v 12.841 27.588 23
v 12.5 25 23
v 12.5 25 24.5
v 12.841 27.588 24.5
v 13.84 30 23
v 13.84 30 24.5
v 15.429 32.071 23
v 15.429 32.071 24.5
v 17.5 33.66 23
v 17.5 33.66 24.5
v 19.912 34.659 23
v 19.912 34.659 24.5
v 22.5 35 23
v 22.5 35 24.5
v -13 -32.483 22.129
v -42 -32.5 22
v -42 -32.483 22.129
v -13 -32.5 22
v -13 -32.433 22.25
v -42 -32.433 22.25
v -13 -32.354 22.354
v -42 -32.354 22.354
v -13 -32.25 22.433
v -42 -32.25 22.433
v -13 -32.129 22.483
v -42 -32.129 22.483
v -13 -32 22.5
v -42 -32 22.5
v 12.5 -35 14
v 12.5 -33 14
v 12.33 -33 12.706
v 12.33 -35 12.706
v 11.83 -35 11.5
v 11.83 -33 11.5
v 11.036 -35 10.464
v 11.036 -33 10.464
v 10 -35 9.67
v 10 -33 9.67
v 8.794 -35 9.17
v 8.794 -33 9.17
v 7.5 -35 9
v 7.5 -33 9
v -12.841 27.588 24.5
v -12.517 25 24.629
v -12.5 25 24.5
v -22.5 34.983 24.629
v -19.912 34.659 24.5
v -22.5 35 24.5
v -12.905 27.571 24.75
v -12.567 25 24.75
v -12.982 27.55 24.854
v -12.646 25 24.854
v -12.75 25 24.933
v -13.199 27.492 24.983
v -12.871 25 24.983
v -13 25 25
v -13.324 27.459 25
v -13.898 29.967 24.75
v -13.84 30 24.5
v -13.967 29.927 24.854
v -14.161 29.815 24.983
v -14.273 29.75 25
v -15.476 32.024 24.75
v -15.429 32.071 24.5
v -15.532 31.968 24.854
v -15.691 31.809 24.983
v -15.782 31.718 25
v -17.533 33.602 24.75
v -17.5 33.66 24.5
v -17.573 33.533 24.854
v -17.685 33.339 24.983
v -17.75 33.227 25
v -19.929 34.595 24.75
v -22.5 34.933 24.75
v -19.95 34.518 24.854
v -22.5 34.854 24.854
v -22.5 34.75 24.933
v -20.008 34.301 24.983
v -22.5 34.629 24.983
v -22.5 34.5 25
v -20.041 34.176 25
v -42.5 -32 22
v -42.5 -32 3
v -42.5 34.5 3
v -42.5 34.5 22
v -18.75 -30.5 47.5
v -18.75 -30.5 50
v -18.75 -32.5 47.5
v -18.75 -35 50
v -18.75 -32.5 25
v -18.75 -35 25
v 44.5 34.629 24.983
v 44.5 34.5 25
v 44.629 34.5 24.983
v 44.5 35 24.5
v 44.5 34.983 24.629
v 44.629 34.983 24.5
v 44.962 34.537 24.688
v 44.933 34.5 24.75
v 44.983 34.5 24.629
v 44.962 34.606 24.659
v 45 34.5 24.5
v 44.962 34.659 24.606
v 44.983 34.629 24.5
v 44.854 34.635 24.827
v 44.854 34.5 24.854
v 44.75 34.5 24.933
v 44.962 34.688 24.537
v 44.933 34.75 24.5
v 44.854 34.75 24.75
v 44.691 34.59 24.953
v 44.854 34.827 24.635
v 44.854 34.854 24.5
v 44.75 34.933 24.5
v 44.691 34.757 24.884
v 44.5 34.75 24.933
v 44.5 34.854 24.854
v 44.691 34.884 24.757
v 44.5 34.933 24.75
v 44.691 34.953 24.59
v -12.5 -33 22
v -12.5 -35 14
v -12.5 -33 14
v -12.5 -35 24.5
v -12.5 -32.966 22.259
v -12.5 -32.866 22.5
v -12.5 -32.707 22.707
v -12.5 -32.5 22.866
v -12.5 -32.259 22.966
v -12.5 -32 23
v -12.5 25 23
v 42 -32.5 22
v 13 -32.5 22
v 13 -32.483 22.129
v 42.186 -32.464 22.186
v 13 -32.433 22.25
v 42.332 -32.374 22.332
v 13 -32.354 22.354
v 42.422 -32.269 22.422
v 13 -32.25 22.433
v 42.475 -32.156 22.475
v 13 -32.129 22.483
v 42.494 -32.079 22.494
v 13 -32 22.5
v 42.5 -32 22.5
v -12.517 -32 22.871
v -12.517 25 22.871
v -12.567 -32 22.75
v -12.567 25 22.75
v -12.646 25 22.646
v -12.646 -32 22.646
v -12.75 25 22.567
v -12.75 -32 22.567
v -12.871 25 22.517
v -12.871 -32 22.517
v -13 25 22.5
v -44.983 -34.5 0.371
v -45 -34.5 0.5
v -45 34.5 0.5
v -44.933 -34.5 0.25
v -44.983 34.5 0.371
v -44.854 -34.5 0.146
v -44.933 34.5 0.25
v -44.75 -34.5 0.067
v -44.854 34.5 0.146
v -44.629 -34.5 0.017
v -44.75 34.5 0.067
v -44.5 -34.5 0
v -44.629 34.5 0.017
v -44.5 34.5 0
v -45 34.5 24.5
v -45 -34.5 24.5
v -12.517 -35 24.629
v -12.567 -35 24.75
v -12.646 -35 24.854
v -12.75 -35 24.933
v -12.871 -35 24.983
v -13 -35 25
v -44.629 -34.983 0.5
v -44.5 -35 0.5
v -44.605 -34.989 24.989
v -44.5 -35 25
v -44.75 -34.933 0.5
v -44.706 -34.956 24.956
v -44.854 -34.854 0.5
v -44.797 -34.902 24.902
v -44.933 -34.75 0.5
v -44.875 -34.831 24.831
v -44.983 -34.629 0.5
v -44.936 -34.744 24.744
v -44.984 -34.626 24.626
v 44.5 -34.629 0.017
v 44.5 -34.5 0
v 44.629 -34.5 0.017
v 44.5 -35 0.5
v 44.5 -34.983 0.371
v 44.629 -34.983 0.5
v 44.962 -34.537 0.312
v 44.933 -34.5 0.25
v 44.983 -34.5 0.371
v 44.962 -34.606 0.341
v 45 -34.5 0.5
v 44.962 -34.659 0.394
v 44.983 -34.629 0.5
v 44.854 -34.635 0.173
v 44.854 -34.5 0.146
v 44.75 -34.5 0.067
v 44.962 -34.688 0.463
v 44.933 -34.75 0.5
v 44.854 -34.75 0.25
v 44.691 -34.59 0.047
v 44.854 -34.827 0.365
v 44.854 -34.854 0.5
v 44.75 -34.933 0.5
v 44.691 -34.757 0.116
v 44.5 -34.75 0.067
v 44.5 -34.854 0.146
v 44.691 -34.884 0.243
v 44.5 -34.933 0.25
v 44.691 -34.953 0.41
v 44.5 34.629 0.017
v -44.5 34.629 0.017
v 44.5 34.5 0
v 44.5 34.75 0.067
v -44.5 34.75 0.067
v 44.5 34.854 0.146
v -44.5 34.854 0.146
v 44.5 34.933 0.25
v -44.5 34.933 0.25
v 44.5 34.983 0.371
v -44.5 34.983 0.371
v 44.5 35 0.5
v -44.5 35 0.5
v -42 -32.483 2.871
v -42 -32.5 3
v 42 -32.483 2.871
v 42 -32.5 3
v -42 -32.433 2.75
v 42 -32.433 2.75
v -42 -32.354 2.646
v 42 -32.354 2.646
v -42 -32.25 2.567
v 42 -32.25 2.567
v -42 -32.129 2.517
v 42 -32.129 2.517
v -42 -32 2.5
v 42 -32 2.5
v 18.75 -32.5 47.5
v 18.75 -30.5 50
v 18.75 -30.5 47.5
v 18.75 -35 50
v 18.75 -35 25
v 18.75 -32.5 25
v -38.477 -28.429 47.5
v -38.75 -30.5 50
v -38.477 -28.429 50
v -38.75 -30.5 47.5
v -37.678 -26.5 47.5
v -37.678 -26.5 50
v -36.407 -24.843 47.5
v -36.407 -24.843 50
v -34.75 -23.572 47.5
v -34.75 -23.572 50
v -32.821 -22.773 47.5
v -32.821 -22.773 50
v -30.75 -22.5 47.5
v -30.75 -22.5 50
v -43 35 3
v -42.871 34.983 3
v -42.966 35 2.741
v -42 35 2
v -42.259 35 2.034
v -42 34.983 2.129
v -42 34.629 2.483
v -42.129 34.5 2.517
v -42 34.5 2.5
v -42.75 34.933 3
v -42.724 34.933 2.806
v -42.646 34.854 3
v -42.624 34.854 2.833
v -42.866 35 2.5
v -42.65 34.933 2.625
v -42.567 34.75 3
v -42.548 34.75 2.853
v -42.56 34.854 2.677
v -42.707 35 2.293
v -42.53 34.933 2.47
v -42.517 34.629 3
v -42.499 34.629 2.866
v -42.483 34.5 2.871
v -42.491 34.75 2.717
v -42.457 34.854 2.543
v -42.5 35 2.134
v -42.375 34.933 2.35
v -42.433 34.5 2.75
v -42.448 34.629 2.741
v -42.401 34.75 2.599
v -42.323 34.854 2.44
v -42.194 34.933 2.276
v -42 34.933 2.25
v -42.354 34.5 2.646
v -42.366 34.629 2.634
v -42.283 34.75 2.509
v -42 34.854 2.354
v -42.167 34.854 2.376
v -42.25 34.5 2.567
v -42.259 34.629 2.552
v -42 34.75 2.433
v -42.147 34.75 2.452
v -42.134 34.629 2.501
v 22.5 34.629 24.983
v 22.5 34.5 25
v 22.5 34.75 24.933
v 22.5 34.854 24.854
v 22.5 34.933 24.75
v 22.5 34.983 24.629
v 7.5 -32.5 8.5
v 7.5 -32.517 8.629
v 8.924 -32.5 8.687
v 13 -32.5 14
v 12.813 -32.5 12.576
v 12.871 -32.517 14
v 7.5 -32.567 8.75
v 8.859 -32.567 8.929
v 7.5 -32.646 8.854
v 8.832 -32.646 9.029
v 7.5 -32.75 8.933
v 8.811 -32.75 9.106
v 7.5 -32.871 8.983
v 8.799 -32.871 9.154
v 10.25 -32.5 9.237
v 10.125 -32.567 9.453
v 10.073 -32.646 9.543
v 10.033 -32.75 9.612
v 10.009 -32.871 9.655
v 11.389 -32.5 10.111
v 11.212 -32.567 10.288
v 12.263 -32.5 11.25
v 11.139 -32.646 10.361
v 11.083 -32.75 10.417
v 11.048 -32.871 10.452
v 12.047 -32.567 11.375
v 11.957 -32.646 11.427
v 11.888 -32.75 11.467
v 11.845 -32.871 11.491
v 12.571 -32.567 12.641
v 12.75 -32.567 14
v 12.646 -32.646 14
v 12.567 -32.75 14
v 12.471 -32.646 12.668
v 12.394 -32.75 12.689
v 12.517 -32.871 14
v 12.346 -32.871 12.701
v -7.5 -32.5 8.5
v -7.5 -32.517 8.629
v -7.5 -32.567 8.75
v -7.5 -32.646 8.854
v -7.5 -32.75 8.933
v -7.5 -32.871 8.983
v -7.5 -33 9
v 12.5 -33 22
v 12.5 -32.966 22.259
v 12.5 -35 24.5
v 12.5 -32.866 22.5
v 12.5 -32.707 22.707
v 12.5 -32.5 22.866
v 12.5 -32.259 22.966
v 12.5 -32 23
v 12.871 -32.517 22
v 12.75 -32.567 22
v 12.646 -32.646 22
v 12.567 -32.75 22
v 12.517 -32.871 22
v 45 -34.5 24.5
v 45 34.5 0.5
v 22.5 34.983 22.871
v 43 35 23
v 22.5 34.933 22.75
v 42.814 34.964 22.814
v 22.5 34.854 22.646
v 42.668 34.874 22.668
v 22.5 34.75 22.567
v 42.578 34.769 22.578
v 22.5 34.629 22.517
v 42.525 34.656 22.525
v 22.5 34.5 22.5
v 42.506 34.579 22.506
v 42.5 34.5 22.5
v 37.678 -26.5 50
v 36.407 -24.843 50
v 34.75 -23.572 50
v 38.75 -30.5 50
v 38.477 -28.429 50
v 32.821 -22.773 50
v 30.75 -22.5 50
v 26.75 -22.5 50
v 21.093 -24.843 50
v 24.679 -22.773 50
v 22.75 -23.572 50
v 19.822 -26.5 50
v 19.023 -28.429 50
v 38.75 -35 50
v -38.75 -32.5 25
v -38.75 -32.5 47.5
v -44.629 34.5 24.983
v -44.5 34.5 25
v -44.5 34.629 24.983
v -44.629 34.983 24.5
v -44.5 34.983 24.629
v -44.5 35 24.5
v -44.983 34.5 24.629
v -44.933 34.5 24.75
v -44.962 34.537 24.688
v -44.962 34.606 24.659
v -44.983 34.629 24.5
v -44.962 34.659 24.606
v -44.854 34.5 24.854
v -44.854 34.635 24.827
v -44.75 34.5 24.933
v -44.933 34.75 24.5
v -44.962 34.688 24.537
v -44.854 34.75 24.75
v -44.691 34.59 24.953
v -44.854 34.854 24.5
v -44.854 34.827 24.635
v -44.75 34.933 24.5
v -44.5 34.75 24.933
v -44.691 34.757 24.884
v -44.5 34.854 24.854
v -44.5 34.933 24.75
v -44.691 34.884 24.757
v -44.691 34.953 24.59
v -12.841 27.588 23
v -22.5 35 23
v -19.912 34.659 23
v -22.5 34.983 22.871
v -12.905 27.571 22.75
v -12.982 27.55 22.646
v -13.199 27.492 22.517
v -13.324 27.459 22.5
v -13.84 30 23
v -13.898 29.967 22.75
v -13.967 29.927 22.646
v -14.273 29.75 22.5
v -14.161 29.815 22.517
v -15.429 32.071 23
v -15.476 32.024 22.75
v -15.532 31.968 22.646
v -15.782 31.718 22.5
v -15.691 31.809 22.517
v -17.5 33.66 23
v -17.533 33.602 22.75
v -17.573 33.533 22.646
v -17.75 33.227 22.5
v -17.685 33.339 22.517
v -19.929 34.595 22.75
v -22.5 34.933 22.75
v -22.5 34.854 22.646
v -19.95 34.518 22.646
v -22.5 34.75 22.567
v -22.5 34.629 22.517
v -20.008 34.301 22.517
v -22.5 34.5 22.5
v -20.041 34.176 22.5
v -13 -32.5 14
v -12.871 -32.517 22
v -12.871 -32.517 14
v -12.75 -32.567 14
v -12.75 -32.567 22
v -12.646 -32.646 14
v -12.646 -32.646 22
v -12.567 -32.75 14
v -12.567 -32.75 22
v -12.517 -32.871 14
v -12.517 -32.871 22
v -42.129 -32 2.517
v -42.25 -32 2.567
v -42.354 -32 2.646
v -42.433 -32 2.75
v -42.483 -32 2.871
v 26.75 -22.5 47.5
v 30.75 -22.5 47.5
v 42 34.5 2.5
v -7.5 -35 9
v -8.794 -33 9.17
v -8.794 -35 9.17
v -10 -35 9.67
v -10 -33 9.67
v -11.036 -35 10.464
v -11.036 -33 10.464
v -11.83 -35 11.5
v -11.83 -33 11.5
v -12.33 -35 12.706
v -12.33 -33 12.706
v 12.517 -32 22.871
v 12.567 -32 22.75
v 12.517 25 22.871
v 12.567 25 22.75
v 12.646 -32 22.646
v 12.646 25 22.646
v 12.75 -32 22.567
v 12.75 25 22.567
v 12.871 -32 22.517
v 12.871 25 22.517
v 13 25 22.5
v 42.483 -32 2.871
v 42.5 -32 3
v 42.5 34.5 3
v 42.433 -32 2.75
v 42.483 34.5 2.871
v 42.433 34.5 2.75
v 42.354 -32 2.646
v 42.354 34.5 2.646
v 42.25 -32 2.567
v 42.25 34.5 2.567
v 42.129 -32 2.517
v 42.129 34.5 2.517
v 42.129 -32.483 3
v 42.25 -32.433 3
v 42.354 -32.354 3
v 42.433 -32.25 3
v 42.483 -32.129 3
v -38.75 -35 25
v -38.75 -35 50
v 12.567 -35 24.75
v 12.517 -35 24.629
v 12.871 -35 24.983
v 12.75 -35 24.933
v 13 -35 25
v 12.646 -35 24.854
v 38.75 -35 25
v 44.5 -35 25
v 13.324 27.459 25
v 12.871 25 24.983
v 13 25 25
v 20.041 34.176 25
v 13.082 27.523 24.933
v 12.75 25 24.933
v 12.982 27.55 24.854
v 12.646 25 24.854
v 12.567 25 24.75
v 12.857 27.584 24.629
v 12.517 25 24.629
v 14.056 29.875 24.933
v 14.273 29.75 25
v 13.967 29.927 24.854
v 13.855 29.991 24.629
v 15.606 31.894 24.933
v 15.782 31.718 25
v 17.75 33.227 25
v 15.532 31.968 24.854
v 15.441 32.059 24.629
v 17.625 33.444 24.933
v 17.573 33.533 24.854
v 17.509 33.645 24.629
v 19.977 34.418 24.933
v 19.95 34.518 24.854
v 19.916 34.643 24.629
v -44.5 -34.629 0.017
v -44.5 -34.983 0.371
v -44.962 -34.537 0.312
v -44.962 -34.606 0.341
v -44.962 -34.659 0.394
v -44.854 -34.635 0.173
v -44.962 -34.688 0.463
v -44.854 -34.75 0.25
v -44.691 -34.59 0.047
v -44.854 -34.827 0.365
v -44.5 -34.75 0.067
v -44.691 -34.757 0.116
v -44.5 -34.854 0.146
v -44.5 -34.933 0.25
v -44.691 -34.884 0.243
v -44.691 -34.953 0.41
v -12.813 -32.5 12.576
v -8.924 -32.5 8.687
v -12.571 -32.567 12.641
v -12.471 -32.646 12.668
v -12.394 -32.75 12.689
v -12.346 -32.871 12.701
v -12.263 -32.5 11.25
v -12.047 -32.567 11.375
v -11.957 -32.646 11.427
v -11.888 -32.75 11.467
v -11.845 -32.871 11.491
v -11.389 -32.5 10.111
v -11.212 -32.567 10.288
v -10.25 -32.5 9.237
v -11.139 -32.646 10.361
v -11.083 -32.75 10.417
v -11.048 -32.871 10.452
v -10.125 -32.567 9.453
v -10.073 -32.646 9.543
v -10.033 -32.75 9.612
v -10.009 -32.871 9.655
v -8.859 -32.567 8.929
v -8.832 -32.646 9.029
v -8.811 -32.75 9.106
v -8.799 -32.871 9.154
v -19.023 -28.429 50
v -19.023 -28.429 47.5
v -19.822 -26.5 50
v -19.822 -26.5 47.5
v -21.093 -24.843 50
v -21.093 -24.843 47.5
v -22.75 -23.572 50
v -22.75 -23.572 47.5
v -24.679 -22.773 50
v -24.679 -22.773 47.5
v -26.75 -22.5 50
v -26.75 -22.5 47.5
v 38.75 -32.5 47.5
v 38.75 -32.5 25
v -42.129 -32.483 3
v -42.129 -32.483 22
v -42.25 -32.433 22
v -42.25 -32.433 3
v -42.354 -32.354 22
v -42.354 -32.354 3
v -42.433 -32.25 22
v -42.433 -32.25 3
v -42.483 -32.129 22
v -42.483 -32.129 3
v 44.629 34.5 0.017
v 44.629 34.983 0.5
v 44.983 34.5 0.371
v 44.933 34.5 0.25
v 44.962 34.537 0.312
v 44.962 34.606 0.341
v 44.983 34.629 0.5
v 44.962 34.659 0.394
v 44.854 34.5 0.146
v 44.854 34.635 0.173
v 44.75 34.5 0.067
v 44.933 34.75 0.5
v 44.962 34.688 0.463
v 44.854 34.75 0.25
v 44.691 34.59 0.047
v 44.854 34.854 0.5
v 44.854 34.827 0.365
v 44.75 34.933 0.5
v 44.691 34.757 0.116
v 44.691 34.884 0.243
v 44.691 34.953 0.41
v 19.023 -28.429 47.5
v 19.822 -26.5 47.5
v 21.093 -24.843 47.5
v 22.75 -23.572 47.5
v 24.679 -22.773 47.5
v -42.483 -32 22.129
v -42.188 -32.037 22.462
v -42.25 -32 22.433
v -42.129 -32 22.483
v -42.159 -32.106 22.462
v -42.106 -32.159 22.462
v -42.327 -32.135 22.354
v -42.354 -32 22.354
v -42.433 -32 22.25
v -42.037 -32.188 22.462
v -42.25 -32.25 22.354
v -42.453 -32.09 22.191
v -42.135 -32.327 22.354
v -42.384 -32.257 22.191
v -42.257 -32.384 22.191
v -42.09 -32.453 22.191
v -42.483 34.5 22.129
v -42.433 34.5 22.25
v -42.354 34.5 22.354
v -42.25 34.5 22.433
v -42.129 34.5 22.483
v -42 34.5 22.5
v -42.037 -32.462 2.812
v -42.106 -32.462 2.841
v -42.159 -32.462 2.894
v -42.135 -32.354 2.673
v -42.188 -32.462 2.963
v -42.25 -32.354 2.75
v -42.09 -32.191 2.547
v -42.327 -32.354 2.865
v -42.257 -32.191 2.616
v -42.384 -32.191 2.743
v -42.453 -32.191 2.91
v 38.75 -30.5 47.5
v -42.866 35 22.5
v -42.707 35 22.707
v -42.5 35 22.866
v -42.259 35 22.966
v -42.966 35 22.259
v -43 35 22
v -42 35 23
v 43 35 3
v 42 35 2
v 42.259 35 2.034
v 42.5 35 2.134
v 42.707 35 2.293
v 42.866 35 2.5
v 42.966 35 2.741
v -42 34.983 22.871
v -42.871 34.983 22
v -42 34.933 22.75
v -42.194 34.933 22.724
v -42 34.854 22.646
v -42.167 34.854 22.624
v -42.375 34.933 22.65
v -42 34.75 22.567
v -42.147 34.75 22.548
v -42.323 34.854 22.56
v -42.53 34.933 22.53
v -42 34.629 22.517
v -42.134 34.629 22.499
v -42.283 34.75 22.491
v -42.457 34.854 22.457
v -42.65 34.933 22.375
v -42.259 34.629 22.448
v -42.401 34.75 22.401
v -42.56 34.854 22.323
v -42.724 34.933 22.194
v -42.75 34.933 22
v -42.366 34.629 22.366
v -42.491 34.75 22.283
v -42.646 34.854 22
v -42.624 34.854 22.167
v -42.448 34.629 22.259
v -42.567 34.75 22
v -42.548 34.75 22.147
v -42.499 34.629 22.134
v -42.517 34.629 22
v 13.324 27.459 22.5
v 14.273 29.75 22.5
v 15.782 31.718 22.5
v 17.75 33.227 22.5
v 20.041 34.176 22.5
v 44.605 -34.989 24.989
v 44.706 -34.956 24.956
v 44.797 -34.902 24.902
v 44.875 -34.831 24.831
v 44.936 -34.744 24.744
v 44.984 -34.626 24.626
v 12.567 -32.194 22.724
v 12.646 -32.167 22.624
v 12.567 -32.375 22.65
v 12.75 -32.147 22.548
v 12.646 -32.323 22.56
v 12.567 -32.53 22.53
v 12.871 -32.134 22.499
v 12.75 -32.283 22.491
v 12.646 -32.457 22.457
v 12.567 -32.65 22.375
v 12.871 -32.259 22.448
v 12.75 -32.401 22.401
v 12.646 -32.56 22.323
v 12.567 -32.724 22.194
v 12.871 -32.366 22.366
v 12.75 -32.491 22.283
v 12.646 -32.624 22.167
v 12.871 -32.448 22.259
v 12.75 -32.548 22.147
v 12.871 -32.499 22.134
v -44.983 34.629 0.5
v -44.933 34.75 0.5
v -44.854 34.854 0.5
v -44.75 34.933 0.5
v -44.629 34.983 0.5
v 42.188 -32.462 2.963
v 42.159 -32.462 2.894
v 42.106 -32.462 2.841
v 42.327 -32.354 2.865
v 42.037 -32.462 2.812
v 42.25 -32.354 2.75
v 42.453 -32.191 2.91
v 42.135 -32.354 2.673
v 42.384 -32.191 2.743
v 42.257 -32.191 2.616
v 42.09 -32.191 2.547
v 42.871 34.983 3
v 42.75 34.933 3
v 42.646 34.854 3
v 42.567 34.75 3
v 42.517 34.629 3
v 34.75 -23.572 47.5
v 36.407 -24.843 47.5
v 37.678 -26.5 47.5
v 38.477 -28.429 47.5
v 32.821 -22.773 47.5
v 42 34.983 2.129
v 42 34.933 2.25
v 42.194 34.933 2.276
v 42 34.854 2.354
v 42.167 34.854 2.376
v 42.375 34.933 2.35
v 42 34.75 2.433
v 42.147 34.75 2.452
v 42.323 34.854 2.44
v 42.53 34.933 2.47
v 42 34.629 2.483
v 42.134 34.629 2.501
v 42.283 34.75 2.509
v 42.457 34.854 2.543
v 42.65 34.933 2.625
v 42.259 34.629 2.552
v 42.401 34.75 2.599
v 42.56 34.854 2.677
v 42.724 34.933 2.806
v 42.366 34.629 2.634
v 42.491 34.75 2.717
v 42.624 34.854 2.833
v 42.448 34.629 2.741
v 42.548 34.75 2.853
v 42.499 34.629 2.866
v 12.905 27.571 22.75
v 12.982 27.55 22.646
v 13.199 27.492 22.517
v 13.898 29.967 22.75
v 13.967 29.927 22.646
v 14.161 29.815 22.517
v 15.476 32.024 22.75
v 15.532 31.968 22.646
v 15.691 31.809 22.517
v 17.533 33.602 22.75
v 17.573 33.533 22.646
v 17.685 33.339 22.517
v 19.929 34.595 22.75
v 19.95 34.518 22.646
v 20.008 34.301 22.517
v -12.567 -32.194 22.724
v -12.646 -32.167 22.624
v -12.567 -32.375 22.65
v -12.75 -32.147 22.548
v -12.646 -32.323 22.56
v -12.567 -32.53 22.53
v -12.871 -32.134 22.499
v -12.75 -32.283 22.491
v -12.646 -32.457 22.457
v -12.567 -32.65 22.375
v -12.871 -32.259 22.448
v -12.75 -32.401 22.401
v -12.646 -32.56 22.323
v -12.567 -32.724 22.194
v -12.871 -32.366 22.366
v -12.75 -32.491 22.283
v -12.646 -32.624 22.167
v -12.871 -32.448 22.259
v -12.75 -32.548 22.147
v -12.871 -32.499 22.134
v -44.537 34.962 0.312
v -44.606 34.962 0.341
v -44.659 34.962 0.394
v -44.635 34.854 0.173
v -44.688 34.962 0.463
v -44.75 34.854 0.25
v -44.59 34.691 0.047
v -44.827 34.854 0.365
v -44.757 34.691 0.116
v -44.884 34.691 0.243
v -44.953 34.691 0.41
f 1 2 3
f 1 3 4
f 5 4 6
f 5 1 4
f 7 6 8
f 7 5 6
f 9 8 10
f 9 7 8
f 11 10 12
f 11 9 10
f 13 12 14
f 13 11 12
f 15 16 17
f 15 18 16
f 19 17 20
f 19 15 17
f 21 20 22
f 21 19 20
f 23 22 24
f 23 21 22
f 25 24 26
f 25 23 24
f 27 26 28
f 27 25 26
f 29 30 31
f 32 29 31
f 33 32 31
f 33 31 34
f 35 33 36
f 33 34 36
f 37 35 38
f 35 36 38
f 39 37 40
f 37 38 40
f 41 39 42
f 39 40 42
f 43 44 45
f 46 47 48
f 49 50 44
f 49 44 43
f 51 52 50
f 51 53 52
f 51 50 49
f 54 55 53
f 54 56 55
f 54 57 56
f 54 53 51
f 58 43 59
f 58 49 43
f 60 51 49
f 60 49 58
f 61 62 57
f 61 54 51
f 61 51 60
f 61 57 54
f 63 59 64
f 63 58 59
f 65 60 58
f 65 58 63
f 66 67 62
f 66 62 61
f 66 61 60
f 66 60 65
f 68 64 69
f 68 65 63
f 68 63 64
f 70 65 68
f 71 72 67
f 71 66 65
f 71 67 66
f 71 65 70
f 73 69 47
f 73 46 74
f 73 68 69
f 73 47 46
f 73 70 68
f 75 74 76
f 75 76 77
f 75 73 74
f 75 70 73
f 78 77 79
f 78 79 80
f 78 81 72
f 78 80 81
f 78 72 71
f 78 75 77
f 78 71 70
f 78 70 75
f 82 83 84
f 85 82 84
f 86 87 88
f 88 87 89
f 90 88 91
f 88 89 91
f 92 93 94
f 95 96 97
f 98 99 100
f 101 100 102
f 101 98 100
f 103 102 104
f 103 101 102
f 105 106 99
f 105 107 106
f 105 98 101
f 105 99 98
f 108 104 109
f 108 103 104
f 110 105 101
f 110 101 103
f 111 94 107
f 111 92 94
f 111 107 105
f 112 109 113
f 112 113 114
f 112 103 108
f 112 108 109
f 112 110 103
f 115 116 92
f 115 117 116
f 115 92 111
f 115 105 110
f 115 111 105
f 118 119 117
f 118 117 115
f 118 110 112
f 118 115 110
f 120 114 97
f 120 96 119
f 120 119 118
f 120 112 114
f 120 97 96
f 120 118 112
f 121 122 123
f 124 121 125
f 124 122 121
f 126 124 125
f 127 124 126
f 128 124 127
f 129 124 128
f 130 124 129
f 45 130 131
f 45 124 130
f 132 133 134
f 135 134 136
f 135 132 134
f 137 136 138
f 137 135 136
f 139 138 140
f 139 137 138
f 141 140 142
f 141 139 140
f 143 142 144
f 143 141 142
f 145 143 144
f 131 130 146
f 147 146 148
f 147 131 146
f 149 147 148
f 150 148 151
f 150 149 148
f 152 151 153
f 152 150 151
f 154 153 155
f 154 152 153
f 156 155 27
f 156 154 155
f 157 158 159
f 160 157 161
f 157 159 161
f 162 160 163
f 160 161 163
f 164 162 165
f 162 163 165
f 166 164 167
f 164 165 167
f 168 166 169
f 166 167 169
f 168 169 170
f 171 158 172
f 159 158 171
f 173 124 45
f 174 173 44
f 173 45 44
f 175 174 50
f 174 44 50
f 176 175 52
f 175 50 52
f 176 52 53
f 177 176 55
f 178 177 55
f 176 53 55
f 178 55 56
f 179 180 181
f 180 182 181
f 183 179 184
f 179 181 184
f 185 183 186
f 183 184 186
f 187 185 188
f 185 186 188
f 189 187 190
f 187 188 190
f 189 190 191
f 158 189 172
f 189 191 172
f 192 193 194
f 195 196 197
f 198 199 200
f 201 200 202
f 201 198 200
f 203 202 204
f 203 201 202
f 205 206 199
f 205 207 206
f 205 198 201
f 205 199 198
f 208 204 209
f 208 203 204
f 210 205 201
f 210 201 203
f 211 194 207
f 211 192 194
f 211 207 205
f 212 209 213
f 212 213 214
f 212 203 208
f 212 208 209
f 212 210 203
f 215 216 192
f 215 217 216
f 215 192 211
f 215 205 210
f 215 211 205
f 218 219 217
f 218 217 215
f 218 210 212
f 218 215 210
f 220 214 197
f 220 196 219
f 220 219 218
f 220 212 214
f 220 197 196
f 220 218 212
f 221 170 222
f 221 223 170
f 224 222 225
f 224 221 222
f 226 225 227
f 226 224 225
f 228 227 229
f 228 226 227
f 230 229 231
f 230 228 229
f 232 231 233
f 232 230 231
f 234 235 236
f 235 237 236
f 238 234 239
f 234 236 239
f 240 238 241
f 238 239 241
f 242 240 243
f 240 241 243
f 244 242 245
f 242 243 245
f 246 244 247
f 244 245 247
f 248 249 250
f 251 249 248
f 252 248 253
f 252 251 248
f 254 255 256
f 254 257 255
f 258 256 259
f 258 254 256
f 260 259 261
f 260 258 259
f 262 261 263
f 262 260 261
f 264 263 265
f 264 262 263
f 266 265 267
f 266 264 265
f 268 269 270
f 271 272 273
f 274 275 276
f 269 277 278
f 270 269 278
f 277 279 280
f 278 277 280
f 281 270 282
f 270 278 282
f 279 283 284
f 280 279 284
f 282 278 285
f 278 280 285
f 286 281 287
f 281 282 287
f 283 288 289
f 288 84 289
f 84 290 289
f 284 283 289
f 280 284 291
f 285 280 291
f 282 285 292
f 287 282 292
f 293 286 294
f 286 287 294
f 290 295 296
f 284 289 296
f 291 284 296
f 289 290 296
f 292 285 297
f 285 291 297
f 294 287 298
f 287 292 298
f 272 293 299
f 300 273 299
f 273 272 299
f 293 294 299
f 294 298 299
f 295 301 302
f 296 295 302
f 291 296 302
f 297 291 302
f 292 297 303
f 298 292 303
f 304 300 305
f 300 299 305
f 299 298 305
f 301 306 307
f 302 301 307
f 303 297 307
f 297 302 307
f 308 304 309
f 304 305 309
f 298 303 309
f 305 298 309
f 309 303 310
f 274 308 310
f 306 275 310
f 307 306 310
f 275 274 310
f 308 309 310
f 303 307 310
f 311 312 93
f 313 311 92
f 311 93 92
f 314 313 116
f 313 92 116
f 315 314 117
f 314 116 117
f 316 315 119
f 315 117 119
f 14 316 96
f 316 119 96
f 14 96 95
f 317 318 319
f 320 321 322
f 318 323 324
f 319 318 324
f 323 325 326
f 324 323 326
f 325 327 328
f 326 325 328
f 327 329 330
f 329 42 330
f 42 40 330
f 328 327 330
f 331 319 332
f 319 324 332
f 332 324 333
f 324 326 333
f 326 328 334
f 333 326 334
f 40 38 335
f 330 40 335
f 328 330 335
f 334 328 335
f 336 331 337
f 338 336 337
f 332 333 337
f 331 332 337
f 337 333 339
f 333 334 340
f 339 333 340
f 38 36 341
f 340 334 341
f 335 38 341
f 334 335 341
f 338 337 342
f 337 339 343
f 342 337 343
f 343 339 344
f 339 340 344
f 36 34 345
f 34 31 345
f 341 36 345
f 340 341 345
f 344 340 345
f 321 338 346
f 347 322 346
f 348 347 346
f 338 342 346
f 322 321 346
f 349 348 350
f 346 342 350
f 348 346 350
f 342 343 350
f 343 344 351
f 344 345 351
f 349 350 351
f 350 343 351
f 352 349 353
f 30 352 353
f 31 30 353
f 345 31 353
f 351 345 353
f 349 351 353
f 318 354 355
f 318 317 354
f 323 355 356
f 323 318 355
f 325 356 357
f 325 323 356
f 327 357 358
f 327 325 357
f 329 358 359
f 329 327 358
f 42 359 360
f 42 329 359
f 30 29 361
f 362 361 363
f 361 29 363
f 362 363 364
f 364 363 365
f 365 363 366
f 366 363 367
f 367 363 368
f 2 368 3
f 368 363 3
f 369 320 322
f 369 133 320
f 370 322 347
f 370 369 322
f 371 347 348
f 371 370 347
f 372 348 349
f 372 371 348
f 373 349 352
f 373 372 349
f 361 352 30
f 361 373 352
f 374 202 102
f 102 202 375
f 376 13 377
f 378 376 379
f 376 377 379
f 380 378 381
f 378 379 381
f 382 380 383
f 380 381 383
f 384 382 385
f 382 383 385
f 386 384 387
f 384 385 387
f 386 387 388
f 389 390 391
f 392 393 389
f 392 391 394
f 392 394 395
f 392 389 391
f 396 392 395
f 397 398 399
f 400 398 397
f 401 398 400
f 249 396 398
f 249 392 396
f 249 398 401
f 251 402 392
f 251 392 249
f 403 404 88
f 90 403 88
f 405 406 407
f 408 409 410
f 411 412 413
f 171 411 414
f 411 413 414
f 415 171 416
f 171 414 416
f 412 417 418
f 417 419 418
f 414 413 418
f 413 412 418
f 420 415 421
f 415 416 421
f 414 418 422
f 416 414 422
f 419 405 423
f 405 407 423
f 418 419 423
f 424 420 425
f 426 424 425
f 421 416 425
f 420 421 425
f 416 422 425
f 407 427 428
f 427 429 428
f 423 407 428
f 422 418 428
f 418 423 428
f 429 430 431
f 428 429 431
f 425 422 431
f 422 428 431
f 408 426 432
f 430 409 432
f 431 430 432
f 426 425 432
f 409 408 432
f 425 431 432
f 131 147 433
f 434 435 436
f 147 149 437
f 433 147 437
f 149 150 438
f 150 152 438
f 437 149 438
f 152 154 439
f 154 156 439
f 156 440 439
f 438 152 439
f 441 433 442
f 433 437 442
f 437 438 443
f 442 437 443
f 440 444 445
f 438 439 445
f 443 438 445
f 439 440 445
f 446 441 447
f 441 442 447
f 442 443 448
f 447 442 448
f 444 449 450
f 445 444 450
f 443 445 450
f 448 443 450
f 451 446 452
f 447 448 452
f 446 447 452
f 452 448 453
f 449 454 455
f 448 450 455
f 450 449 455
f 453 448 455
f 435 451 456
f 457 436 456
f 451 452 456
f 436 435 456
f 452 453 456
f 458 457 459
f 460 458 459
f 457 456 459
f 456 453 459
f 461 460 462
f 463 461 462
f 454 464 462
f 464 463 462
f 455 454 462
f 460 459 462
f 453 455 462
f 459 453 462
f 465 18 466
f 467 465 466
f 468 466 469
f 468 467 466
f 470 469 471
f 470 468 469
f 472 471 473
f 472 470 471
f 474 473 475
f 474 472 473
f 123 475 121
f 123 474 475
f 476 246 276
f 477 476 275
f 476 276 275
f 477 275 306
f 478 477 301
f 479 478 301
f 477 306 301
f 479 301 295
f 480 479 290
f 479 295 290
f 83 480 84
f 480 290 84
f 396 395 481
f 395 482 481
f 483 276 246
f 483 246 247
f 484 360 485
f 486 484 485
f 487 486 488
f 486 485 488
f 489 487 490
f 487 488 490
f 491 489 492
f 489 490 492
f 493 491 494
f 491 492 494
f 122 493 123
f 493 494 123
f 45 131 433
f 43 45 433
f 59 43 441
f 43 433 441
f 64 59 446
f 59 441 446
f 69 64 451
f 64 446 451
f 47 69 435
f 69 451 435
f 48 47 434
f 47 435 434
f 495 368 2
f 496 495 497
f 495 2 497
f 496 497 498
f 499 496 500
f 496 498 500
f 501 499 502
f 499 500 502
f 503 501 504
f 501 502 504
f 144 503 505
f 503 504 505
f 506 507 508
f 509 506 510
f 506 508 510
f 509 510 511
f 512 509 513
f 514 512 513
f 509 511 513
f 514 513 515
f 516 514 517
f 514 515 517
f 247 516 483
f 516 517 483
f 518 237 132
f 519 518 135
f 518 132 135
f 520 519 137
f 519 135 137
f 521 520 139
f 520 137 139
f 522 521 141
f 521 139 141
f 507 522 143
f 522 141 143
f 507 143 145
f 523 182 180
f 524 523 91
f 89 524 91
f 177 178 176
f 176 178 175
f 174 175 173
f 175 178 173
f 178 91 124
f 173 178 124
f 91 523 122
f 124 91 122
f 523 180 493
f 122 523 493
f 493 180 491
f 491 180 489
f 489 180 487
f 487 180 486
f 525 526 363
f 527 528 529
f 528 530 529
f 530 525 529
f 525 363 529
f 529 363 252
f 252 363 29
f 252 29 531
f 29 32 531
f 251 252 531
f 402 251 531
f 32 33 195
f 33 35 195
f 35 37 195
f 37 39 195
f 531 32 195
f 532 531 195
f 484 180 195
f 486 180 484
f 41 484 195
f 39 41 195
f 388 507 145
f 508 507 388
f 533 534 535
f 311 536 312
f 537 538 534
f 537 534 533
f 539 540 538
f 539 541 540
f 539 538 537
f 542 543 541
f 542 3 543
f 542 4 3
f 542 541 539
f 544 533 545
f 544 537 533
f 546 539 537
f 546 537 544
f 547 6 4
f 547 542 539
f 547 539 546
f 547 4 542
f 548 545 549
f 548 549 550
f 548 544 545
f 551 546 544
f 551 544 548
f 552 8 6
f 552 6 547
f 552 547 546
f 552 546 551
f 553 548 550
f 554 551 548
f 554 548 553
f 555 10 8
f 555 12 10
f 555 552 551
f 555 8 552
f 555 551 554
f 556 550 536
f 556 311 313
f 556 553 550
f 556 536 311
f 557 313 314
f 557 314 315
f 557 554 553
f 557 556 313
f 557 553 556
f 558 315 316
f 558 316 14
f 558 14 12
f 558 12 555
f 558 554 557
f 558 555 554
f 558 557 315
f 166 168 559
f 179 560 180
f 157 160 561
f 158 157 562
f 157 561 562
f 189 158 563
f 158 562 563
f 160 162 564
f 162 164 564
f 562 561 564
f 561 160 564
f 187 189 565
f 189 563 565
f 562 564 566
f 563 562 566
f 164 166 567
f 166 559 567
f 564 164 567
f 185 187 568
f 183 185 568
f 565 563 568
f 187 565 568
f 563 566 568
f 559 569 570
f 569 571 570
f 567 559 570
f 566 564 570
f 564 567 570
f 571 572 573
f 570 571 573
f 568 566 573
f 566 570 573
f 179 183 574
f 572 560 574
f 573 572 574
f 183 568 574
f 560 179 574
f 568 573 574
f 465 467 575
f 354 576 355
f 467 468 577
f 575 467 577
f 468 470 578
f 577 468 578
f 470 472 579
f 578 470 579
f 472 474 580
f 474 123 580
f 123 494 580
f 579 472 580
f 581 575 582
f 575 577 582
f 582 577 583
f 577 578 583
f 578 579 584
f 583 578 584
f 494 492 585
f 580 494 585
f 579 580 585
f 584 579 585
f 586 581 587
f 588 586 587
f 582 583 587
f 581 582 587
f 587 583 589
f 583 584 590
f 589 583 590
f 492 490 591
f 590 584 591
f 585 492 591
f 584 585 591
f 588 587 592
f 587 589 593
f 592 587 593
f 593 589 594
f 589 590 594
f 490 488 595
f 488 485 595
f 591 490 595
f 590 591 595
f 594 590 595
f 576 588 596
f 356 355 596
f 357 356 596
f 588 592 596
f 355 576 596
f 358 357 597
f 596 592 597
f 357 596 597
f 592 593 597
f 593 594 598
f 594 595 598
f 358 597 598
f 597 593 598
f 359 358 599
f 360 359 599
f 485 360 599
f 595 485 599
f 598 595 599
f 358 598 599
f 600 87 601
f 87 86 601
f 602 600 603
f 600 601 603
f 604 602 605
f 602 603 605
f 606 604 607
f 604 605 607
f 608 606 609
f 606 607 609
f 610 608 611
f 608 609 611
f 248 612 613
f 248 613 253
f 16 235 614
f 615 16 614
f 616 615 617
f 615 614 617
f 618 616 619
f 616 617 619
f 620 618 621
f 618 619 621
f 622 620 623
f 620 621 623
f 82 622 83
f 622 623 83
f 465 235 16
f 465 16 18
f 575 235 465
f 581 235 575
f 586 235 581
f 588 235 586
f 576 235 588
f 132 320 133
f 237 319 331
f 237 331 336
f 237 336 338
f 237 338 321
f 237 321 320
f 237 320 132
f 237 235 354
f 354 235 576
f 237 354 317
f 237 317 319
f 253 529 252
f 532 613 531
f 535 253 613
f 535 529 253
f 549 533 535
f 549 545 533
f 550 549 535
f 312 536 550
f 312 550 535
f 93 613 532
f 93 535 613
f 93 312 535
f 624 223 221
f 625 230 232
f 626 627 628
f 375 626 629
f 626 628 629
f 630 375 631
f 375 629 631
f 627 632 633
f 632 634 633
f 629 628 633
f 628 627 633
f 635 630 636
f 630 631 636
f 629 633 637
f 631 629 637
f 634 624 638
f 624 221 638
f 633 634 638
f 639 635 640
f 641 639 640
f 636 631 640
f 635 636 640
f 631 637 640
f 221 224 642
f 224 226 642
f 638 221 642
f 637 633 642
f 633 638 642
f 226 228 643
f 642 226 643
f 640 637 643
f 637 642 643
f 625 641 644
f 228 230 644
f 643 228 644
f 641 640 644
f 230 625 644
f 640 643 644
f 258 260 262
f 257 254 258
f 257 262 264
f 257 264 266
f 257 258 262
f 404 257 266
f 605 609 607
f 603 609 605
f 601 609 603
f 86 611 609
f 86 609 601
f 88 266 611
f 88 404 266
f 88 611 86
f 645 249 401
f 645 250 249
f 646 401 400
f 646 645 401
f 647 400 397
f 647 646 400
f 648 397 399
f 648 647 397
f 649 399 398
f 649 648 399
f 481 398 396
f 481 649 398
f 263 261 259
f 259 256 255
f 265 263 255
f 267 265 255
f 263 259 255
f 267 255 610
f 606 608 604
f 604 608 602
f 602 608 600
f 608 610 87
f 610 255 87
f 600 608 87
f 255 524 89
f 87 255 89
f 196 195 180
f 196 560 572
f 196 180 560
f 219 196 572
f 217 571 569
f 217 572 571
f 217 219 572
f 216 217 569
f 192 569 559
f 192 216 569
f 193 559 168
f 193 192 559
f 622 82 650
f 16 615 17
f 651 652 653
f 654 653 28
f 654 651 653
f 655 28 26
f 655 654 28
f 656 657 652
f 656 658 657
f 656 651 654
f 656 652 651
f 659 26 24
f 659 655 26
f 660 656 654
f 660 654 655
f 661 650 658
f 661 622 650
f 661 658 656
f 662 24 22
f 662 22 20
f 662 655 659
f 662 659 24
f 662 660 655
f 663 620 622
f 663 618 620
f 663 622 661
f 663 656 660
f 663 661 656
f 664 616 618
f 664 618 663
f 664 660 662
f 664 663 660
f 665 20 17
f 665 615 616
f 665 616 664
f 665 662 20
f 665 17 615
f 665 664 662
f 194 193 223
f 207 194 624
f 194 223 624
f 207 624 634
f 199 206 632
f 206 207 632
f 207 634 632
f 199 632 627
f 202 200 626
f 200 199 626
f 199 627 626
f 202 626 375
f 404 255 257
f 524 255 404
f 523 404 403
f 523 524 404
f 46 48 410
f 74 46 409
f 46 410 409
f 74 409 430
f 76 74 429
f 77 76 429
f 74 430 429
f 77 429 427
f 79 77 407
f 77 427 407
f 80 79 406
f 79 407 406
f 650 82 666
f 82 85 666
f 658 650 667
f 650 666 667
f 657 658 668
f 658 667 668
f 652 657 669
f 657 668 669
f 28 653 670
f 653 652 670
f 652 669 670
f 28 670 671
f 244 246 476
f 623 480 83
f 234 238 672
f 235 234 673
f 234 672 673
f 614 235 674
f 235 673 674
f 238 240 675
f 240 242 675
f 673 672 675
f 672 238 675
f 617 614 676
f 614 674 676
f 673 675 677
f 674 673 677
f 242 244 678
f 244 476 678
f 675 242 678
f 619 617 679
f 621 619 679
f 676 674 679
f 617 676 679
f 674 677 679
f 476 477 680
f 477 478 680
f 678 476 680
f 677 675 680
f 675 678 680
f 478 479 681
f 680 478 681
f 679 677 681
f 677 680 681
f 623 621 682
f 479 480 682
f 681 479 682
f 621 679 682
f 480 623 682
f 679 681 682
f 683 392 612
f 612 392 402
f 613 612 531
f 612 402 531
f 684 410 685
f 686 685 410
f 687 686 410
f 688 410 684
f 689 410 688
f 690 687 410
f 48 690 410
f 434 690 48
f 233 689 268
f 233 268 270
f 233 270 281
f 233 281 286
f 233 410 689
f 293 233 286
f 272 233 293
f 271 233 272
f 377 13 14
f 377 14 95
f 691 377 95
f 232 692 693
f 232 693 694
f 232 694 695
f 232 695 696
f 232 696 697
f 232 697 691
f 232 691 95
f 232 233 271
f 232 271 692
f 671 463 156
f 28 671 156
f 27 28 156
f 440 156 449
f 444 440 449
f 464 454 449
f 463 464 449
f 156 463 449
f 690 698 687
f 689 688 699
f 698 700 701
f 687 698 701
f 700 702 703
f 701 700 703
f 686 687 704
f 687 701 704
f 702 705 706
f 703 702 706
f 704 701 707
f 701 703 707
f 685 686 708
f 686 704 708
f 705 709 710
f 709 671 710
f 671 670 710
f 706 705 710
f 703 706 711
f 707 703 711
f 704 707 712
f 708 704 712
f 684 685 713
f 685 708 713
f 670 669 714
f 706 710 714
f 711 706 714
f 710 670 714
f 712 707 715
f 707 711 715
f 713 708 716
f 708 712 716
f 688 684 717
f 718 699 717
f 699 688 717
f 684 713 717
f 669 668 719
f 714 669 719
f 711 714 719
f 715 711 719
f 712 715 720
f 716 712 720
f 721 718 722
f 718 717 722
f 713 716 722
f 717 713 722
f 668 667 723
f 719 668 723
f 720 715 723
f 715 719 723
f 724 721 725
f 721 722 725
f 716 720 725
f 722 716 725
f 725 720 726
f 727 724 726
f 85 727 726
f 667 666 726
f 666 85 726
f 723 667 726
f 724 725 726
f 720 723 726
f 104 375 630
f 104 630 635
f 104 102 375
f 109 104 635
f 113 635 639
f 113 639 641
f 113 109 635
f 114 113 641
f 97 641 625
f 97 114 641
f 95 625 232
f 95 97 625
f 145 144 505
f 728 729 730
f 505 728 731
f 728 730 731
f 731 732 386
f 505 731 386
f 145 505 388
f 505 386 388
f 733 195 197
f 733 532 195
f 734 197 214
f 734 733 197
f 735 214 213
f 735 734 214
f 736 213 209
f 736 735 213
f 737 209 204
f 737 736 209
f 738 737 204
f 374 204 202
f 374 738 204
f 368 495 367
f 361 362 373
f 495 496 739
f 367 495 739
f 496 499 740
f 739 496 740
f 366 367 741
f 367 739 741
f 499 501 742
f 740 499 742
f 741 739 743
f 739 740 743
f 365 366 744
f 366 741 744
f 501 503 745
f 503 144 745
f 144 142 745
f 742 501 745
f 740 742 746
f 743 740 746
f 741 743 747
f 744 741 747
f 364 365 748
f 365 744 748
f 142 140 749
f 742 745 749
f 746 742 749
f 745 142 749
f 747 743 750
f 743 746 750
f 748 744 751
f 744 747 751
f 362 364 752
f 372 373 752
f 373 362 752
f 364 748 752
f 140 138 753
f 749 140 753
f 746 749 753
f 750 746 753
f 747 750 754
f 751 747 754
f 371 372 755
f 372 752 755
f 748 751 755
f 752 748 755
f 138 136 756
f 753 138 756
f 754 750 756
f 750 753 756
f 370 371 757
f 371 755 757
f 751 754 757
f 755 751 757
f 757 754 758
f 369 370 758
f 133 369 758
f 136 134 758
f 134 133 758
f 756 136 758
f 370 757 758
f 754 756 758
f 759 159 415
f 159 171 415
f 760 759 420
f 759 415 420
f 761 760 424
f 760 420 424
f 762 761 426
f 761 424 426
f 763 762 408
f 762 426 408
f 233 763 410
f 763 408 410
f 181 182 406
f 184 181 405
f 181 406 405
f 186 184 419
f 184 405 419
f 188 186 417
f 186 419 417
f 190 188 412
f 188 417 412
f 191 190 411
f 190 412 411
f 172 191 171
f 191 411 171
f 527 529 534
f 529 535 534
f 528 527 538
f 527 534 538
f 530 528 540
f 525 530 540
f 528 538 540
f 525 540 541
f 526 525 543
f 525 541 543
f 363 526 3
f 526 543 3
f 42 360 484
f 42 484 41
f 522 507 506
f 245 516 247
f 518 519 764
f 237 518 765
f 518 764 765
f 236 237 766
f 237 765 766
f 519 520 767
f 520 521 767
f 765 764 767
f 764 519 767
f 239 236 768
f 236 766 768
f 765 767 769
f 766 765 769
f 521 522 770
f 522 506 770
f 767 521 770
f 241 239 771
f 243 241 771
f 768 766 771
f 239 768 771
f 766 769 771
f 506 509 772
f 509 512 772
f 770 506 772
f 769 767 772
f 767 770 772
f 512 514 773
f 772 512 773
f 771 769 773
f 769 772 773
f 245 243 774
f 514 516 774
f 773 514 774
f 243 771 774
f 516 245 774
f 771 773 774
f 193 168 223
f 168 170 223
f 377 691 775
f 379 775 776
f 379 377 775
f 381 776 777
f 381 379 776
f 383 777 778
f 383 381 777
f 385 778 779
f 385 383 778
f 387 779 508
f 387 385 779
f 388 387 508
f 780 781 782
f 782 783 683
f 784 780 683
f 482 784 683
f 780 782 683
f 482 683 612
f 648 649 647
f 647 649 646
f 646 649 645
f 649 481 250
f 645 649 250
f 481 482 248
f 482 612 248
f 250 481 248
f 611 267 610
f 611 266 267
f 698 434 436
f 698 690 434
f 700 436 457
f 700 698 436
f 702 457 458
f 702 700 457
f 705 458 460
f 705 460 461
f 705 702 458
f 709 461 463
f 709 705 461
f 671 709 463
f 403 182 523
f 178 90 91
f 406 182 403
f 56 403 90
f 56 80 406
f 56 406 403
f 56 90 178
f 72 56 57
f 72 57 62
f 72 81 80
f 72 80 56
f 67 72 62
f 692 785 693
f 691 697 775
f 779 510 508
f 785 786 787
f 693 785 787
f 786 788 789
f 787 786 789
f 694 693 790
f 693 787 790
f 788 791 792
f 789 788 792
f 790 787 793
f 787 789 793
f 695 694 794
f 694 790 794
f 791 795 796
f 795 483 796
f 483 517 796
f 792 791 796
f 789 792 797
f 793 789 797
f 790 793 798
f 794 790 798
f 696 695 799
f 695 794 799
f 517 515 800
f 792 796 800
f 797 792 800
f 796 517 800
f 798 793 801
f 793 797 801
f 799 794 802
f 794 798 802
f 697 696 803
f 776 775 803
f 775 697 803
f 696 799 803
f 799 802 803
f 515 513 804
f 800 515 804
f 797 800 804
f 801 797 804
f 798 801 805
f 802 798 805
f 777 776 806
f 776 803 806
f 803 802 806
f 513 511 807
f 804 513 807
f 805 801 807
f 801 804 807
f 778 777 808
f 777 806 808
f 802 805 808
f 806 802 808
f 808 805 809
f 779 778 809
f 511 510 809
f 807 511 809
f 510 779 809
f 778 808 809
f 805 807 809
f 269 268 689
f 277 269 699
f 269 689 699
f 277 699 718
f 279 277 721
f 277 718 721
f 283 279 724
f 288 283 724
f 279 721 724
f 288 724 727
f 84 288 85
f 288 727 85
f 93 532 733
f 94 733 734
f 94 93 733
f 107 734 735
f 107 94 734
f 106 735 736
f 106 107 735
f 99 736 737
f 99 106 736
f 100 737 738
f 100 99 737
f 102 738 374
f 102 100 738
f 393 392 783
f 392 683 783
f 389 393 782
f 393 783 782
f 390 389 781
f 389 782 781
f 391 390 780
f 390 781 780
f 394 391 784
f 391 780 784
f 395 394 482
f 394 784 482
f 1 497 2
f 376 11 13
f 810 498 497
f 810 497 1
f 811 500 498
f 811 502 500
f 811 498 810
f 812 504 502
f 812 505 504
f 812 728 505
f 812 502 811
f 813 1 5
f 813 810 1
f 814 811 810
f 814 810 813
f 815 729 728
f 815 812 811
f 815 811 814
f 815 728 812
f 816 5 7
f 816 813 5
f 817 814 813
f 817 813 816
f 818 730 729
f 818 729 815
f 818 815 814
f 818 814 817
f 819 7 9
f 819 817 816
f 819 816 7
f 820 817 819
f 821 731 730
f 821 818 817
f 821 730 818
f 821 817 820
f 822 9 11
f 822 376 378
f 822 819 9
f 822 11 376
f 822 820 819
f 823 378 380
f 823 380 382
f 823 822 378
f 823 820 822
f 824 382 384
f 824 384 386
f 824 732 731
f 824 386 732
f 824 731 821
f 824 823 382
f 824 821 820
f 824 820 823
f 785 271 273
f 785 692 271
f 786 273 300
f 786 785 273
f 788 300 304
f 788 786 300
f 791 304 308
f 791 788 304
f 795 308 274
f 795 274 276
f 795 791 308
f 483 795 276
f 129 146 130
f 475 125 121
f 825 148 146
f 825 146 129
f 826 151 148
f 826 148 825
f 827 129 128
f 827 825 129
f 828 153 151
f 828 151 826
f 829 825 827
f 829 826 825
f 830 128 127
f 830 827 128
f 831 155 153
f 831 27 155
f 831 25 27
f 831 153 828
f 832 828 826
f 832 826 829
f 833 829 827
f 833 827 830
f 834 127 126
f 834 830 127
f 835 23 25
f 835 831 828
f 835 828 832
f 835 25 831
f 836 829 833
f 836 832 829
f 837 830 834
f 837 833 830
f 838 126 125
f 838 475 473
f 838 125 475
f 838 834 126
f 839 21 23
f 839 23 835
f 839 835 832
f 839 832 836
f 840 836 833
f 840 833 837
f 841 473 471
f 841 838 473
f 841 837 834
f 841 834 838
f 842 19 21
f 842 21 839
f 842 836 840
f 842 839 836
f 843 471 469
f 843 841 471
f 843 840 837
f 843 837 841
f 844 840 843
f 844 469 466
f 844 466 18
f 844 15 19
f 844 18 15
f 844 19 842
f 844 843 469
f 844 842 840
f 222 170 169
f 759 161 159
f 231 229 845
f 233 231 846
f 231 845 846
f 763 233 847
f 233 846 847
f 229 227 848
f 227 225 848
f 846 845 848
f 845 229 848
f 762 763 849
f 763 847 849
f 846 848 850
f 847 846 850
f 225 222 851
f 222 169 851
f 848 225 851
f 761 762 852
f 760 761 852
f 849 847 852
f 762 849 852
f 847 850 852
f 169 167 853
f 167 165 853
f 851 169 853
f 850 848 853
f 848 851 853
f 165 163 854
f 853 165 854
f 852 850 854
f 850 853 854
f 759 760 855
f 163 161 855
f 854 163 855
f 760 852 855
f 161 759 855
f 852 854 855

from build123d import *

# Parameters (mm, degrees)
SKETCH1_W            = 90
SKETCH1_H            = 70
BOSS_EXTRUDE1_DEPTH  = 25
SHELL1_T             = -2.5
SKETCH2_W            = 25
SKETCH2_H            = 70
CUT_EXTRUDE1_DEPTH   = 16
SKETCH3_W            = 20
SKETCH3_H            = 2.5
BOSS_EXTRUDE2_DEPTH  = 25
SKETCH4_W            = 20
SKETCH4_H            = 2.5
BOSS_EXTRUDE3_DEPTH  = 10
FILLET1_R            = 8
FILLET1_OF_MIRROR2_R = 8
FILLET3_R            = 10
FILLET4_R            = 5
FILLET5_R            = 0.5


with BuildPart() as part:
    # Sketch1 → Boss-Extrude1 (new body)
    with BuildSketch(Plane.XY):
        Rectangle(SKETCH1_W, SKETCH1_H)
    extrude(amount=BOSS_EXTRUDE1_DEPTH)

    # Shell1
    shell1_openings = [part.faces().sort_by_distance(p)[0] for p in [
        (0, 35, 12.5),
    ]]
    offset(amount=SHELL1_T, openings=shell1_openings, kind=Kind.INTERSECTION)

    # Sketch2 → Cut-Extrude1 (cut)
    with BuildSketch(Plane.XY.offset(25)):
        Rectangle(SKETCH2_W, SKETCH2_H)
    extrude(amount=-CUT_EXTRUDE1_DEPTH, mode=Mode.SUBTRACT)

    # Sketch3 → Boss-Extrude2 (add)
    with BuildSketch(Plane.XY.offset(25)):
        with Locations((-28.75, -33.75)):
            Rectangle(SKETCH3_W, SKETCH3_H)
    boss_extrude2 = extrude(amount=BOSS_EXTRUDE2_DEPTH)

    # Sketch4 → Boss-Extrude3 (add)
    with BuildSketch(Plane(origin=(0, -32.5, 0), x_dir=(1, 0, 0), z_dir=(0, 1, 0))):
        with Locations((-28.75, -48.75)):
            Rectangle(SKETCH4_W, SKETCH4_H)
    boss_extrude3 = extrude(amount=BOSS_EXTRUDE3_DEPTH)

    # Fillet1
    fillet1_edges = [part.edges().sort_by_distance(p)[0] for p in [
        (-18.75, -22.5, 48.75),
        (-38.75, -22.5, 48.75),
    ]]
    fillet(fillet1_edges, radius=FILLET1_R)

    # Mirror2: Boss-Extrude2, Boss-Extrude3 across plane
    add(boss_extrude2.mirror(Plane(origin=(0, 0, 0), x_dir=(0, 0, 1), z_dir=(1, 0, 0))))
    add(boss_extrude3.mirror(Plane(origin=(0, 0, 0), x_dir=(0, 0, 1), z_dir=(1, 0, 0))))

    # Fillet1 of Mirror2
    fillet1_of_mirror2_edges = [part.edges().sort_by_distance(p)[0] for p in [
        (18.75, -22.5, 48.75),
        (38.75, -22.5, 48.75),
    ]]
    fillet(fillet1_of_mirror2_edges, radius=FILLET1_OF_MIRROR2_R)

    # Fillet3
    fillet3_edges = [part.edges().sort_by_distance(p)[0] for p in [
        (-12.5, 35, 23.75),
        (12.5, 35, 23.75),
    ]]
    fillet(fillet3_edges, radius=FILLET3_R)

    # Fillet4
    fillet4_edges = [part.edges().sort_by_distance(p)[0] for p in [
        (-12.5, -33.75, 9),
        (12.5, -33.75, 9),
    ]]
    fillet(fillet4_edges, radius=FILLET4_R)

    # Fillet5
    fillet5_edges = [part.edges().sort_by_distance(p)[0] for p in [
        (-12.5, -3.75, 22.5),
        (-12.5, -5, 25),
        (-33.75, 35, 25),
        (-15.428932188, 32.071067812, 25),
        (-32.5, 35, 22.5),
        (-15.428932188, 32.071067812, 22.5),
        (15.428932188, 32.071067812, 25),
        (-45, 0, 25),
        (15.428932188, 32.071067812, 22.5),
        (0, -32.5, 9),
        (-12.5, -32.5, 18.25),
        (11.035533906, -32.5, 10.464466094),
        (-11.035533906, -32.5, 10.464466094),
        (42.5, 1.25, 2.5),
        (42.5, -32.5, 12.5),
        (0, 35, 2.5),
        (42.5, 35, 12.5),
        (-42.5, 1.25, 2.5),
        (-42.5, 35, 12.5),
        (0, -32.5, 2.5),
        (-42.5, -32.5, 12.5),
        (32.5, 35, 22.5),
        (-42.5, 1.25, 22.5),
        (-27.5, -32.5, 22.5),
        (27.5, -32.5, 22.5),
        (12.5, -3.75, 22.5),
        (12.5, -32.5, 18.25),
        (12.5, -5, 25),
        (45, 0, 25),
        (0, -35, 0),
        (-45, 0, 0),
        (0, 35, 0),
        (45, 0, 0),
        (45, -35, 12.5),
        (-45, -35, 12.5),
        (-45, 35, 12.5),
        (45, 35, 12.5),
        (33.75, 35, 25),
    ]]
    fillet(fillet5_edges, radius=FILLET5_R)


solid = part.part
